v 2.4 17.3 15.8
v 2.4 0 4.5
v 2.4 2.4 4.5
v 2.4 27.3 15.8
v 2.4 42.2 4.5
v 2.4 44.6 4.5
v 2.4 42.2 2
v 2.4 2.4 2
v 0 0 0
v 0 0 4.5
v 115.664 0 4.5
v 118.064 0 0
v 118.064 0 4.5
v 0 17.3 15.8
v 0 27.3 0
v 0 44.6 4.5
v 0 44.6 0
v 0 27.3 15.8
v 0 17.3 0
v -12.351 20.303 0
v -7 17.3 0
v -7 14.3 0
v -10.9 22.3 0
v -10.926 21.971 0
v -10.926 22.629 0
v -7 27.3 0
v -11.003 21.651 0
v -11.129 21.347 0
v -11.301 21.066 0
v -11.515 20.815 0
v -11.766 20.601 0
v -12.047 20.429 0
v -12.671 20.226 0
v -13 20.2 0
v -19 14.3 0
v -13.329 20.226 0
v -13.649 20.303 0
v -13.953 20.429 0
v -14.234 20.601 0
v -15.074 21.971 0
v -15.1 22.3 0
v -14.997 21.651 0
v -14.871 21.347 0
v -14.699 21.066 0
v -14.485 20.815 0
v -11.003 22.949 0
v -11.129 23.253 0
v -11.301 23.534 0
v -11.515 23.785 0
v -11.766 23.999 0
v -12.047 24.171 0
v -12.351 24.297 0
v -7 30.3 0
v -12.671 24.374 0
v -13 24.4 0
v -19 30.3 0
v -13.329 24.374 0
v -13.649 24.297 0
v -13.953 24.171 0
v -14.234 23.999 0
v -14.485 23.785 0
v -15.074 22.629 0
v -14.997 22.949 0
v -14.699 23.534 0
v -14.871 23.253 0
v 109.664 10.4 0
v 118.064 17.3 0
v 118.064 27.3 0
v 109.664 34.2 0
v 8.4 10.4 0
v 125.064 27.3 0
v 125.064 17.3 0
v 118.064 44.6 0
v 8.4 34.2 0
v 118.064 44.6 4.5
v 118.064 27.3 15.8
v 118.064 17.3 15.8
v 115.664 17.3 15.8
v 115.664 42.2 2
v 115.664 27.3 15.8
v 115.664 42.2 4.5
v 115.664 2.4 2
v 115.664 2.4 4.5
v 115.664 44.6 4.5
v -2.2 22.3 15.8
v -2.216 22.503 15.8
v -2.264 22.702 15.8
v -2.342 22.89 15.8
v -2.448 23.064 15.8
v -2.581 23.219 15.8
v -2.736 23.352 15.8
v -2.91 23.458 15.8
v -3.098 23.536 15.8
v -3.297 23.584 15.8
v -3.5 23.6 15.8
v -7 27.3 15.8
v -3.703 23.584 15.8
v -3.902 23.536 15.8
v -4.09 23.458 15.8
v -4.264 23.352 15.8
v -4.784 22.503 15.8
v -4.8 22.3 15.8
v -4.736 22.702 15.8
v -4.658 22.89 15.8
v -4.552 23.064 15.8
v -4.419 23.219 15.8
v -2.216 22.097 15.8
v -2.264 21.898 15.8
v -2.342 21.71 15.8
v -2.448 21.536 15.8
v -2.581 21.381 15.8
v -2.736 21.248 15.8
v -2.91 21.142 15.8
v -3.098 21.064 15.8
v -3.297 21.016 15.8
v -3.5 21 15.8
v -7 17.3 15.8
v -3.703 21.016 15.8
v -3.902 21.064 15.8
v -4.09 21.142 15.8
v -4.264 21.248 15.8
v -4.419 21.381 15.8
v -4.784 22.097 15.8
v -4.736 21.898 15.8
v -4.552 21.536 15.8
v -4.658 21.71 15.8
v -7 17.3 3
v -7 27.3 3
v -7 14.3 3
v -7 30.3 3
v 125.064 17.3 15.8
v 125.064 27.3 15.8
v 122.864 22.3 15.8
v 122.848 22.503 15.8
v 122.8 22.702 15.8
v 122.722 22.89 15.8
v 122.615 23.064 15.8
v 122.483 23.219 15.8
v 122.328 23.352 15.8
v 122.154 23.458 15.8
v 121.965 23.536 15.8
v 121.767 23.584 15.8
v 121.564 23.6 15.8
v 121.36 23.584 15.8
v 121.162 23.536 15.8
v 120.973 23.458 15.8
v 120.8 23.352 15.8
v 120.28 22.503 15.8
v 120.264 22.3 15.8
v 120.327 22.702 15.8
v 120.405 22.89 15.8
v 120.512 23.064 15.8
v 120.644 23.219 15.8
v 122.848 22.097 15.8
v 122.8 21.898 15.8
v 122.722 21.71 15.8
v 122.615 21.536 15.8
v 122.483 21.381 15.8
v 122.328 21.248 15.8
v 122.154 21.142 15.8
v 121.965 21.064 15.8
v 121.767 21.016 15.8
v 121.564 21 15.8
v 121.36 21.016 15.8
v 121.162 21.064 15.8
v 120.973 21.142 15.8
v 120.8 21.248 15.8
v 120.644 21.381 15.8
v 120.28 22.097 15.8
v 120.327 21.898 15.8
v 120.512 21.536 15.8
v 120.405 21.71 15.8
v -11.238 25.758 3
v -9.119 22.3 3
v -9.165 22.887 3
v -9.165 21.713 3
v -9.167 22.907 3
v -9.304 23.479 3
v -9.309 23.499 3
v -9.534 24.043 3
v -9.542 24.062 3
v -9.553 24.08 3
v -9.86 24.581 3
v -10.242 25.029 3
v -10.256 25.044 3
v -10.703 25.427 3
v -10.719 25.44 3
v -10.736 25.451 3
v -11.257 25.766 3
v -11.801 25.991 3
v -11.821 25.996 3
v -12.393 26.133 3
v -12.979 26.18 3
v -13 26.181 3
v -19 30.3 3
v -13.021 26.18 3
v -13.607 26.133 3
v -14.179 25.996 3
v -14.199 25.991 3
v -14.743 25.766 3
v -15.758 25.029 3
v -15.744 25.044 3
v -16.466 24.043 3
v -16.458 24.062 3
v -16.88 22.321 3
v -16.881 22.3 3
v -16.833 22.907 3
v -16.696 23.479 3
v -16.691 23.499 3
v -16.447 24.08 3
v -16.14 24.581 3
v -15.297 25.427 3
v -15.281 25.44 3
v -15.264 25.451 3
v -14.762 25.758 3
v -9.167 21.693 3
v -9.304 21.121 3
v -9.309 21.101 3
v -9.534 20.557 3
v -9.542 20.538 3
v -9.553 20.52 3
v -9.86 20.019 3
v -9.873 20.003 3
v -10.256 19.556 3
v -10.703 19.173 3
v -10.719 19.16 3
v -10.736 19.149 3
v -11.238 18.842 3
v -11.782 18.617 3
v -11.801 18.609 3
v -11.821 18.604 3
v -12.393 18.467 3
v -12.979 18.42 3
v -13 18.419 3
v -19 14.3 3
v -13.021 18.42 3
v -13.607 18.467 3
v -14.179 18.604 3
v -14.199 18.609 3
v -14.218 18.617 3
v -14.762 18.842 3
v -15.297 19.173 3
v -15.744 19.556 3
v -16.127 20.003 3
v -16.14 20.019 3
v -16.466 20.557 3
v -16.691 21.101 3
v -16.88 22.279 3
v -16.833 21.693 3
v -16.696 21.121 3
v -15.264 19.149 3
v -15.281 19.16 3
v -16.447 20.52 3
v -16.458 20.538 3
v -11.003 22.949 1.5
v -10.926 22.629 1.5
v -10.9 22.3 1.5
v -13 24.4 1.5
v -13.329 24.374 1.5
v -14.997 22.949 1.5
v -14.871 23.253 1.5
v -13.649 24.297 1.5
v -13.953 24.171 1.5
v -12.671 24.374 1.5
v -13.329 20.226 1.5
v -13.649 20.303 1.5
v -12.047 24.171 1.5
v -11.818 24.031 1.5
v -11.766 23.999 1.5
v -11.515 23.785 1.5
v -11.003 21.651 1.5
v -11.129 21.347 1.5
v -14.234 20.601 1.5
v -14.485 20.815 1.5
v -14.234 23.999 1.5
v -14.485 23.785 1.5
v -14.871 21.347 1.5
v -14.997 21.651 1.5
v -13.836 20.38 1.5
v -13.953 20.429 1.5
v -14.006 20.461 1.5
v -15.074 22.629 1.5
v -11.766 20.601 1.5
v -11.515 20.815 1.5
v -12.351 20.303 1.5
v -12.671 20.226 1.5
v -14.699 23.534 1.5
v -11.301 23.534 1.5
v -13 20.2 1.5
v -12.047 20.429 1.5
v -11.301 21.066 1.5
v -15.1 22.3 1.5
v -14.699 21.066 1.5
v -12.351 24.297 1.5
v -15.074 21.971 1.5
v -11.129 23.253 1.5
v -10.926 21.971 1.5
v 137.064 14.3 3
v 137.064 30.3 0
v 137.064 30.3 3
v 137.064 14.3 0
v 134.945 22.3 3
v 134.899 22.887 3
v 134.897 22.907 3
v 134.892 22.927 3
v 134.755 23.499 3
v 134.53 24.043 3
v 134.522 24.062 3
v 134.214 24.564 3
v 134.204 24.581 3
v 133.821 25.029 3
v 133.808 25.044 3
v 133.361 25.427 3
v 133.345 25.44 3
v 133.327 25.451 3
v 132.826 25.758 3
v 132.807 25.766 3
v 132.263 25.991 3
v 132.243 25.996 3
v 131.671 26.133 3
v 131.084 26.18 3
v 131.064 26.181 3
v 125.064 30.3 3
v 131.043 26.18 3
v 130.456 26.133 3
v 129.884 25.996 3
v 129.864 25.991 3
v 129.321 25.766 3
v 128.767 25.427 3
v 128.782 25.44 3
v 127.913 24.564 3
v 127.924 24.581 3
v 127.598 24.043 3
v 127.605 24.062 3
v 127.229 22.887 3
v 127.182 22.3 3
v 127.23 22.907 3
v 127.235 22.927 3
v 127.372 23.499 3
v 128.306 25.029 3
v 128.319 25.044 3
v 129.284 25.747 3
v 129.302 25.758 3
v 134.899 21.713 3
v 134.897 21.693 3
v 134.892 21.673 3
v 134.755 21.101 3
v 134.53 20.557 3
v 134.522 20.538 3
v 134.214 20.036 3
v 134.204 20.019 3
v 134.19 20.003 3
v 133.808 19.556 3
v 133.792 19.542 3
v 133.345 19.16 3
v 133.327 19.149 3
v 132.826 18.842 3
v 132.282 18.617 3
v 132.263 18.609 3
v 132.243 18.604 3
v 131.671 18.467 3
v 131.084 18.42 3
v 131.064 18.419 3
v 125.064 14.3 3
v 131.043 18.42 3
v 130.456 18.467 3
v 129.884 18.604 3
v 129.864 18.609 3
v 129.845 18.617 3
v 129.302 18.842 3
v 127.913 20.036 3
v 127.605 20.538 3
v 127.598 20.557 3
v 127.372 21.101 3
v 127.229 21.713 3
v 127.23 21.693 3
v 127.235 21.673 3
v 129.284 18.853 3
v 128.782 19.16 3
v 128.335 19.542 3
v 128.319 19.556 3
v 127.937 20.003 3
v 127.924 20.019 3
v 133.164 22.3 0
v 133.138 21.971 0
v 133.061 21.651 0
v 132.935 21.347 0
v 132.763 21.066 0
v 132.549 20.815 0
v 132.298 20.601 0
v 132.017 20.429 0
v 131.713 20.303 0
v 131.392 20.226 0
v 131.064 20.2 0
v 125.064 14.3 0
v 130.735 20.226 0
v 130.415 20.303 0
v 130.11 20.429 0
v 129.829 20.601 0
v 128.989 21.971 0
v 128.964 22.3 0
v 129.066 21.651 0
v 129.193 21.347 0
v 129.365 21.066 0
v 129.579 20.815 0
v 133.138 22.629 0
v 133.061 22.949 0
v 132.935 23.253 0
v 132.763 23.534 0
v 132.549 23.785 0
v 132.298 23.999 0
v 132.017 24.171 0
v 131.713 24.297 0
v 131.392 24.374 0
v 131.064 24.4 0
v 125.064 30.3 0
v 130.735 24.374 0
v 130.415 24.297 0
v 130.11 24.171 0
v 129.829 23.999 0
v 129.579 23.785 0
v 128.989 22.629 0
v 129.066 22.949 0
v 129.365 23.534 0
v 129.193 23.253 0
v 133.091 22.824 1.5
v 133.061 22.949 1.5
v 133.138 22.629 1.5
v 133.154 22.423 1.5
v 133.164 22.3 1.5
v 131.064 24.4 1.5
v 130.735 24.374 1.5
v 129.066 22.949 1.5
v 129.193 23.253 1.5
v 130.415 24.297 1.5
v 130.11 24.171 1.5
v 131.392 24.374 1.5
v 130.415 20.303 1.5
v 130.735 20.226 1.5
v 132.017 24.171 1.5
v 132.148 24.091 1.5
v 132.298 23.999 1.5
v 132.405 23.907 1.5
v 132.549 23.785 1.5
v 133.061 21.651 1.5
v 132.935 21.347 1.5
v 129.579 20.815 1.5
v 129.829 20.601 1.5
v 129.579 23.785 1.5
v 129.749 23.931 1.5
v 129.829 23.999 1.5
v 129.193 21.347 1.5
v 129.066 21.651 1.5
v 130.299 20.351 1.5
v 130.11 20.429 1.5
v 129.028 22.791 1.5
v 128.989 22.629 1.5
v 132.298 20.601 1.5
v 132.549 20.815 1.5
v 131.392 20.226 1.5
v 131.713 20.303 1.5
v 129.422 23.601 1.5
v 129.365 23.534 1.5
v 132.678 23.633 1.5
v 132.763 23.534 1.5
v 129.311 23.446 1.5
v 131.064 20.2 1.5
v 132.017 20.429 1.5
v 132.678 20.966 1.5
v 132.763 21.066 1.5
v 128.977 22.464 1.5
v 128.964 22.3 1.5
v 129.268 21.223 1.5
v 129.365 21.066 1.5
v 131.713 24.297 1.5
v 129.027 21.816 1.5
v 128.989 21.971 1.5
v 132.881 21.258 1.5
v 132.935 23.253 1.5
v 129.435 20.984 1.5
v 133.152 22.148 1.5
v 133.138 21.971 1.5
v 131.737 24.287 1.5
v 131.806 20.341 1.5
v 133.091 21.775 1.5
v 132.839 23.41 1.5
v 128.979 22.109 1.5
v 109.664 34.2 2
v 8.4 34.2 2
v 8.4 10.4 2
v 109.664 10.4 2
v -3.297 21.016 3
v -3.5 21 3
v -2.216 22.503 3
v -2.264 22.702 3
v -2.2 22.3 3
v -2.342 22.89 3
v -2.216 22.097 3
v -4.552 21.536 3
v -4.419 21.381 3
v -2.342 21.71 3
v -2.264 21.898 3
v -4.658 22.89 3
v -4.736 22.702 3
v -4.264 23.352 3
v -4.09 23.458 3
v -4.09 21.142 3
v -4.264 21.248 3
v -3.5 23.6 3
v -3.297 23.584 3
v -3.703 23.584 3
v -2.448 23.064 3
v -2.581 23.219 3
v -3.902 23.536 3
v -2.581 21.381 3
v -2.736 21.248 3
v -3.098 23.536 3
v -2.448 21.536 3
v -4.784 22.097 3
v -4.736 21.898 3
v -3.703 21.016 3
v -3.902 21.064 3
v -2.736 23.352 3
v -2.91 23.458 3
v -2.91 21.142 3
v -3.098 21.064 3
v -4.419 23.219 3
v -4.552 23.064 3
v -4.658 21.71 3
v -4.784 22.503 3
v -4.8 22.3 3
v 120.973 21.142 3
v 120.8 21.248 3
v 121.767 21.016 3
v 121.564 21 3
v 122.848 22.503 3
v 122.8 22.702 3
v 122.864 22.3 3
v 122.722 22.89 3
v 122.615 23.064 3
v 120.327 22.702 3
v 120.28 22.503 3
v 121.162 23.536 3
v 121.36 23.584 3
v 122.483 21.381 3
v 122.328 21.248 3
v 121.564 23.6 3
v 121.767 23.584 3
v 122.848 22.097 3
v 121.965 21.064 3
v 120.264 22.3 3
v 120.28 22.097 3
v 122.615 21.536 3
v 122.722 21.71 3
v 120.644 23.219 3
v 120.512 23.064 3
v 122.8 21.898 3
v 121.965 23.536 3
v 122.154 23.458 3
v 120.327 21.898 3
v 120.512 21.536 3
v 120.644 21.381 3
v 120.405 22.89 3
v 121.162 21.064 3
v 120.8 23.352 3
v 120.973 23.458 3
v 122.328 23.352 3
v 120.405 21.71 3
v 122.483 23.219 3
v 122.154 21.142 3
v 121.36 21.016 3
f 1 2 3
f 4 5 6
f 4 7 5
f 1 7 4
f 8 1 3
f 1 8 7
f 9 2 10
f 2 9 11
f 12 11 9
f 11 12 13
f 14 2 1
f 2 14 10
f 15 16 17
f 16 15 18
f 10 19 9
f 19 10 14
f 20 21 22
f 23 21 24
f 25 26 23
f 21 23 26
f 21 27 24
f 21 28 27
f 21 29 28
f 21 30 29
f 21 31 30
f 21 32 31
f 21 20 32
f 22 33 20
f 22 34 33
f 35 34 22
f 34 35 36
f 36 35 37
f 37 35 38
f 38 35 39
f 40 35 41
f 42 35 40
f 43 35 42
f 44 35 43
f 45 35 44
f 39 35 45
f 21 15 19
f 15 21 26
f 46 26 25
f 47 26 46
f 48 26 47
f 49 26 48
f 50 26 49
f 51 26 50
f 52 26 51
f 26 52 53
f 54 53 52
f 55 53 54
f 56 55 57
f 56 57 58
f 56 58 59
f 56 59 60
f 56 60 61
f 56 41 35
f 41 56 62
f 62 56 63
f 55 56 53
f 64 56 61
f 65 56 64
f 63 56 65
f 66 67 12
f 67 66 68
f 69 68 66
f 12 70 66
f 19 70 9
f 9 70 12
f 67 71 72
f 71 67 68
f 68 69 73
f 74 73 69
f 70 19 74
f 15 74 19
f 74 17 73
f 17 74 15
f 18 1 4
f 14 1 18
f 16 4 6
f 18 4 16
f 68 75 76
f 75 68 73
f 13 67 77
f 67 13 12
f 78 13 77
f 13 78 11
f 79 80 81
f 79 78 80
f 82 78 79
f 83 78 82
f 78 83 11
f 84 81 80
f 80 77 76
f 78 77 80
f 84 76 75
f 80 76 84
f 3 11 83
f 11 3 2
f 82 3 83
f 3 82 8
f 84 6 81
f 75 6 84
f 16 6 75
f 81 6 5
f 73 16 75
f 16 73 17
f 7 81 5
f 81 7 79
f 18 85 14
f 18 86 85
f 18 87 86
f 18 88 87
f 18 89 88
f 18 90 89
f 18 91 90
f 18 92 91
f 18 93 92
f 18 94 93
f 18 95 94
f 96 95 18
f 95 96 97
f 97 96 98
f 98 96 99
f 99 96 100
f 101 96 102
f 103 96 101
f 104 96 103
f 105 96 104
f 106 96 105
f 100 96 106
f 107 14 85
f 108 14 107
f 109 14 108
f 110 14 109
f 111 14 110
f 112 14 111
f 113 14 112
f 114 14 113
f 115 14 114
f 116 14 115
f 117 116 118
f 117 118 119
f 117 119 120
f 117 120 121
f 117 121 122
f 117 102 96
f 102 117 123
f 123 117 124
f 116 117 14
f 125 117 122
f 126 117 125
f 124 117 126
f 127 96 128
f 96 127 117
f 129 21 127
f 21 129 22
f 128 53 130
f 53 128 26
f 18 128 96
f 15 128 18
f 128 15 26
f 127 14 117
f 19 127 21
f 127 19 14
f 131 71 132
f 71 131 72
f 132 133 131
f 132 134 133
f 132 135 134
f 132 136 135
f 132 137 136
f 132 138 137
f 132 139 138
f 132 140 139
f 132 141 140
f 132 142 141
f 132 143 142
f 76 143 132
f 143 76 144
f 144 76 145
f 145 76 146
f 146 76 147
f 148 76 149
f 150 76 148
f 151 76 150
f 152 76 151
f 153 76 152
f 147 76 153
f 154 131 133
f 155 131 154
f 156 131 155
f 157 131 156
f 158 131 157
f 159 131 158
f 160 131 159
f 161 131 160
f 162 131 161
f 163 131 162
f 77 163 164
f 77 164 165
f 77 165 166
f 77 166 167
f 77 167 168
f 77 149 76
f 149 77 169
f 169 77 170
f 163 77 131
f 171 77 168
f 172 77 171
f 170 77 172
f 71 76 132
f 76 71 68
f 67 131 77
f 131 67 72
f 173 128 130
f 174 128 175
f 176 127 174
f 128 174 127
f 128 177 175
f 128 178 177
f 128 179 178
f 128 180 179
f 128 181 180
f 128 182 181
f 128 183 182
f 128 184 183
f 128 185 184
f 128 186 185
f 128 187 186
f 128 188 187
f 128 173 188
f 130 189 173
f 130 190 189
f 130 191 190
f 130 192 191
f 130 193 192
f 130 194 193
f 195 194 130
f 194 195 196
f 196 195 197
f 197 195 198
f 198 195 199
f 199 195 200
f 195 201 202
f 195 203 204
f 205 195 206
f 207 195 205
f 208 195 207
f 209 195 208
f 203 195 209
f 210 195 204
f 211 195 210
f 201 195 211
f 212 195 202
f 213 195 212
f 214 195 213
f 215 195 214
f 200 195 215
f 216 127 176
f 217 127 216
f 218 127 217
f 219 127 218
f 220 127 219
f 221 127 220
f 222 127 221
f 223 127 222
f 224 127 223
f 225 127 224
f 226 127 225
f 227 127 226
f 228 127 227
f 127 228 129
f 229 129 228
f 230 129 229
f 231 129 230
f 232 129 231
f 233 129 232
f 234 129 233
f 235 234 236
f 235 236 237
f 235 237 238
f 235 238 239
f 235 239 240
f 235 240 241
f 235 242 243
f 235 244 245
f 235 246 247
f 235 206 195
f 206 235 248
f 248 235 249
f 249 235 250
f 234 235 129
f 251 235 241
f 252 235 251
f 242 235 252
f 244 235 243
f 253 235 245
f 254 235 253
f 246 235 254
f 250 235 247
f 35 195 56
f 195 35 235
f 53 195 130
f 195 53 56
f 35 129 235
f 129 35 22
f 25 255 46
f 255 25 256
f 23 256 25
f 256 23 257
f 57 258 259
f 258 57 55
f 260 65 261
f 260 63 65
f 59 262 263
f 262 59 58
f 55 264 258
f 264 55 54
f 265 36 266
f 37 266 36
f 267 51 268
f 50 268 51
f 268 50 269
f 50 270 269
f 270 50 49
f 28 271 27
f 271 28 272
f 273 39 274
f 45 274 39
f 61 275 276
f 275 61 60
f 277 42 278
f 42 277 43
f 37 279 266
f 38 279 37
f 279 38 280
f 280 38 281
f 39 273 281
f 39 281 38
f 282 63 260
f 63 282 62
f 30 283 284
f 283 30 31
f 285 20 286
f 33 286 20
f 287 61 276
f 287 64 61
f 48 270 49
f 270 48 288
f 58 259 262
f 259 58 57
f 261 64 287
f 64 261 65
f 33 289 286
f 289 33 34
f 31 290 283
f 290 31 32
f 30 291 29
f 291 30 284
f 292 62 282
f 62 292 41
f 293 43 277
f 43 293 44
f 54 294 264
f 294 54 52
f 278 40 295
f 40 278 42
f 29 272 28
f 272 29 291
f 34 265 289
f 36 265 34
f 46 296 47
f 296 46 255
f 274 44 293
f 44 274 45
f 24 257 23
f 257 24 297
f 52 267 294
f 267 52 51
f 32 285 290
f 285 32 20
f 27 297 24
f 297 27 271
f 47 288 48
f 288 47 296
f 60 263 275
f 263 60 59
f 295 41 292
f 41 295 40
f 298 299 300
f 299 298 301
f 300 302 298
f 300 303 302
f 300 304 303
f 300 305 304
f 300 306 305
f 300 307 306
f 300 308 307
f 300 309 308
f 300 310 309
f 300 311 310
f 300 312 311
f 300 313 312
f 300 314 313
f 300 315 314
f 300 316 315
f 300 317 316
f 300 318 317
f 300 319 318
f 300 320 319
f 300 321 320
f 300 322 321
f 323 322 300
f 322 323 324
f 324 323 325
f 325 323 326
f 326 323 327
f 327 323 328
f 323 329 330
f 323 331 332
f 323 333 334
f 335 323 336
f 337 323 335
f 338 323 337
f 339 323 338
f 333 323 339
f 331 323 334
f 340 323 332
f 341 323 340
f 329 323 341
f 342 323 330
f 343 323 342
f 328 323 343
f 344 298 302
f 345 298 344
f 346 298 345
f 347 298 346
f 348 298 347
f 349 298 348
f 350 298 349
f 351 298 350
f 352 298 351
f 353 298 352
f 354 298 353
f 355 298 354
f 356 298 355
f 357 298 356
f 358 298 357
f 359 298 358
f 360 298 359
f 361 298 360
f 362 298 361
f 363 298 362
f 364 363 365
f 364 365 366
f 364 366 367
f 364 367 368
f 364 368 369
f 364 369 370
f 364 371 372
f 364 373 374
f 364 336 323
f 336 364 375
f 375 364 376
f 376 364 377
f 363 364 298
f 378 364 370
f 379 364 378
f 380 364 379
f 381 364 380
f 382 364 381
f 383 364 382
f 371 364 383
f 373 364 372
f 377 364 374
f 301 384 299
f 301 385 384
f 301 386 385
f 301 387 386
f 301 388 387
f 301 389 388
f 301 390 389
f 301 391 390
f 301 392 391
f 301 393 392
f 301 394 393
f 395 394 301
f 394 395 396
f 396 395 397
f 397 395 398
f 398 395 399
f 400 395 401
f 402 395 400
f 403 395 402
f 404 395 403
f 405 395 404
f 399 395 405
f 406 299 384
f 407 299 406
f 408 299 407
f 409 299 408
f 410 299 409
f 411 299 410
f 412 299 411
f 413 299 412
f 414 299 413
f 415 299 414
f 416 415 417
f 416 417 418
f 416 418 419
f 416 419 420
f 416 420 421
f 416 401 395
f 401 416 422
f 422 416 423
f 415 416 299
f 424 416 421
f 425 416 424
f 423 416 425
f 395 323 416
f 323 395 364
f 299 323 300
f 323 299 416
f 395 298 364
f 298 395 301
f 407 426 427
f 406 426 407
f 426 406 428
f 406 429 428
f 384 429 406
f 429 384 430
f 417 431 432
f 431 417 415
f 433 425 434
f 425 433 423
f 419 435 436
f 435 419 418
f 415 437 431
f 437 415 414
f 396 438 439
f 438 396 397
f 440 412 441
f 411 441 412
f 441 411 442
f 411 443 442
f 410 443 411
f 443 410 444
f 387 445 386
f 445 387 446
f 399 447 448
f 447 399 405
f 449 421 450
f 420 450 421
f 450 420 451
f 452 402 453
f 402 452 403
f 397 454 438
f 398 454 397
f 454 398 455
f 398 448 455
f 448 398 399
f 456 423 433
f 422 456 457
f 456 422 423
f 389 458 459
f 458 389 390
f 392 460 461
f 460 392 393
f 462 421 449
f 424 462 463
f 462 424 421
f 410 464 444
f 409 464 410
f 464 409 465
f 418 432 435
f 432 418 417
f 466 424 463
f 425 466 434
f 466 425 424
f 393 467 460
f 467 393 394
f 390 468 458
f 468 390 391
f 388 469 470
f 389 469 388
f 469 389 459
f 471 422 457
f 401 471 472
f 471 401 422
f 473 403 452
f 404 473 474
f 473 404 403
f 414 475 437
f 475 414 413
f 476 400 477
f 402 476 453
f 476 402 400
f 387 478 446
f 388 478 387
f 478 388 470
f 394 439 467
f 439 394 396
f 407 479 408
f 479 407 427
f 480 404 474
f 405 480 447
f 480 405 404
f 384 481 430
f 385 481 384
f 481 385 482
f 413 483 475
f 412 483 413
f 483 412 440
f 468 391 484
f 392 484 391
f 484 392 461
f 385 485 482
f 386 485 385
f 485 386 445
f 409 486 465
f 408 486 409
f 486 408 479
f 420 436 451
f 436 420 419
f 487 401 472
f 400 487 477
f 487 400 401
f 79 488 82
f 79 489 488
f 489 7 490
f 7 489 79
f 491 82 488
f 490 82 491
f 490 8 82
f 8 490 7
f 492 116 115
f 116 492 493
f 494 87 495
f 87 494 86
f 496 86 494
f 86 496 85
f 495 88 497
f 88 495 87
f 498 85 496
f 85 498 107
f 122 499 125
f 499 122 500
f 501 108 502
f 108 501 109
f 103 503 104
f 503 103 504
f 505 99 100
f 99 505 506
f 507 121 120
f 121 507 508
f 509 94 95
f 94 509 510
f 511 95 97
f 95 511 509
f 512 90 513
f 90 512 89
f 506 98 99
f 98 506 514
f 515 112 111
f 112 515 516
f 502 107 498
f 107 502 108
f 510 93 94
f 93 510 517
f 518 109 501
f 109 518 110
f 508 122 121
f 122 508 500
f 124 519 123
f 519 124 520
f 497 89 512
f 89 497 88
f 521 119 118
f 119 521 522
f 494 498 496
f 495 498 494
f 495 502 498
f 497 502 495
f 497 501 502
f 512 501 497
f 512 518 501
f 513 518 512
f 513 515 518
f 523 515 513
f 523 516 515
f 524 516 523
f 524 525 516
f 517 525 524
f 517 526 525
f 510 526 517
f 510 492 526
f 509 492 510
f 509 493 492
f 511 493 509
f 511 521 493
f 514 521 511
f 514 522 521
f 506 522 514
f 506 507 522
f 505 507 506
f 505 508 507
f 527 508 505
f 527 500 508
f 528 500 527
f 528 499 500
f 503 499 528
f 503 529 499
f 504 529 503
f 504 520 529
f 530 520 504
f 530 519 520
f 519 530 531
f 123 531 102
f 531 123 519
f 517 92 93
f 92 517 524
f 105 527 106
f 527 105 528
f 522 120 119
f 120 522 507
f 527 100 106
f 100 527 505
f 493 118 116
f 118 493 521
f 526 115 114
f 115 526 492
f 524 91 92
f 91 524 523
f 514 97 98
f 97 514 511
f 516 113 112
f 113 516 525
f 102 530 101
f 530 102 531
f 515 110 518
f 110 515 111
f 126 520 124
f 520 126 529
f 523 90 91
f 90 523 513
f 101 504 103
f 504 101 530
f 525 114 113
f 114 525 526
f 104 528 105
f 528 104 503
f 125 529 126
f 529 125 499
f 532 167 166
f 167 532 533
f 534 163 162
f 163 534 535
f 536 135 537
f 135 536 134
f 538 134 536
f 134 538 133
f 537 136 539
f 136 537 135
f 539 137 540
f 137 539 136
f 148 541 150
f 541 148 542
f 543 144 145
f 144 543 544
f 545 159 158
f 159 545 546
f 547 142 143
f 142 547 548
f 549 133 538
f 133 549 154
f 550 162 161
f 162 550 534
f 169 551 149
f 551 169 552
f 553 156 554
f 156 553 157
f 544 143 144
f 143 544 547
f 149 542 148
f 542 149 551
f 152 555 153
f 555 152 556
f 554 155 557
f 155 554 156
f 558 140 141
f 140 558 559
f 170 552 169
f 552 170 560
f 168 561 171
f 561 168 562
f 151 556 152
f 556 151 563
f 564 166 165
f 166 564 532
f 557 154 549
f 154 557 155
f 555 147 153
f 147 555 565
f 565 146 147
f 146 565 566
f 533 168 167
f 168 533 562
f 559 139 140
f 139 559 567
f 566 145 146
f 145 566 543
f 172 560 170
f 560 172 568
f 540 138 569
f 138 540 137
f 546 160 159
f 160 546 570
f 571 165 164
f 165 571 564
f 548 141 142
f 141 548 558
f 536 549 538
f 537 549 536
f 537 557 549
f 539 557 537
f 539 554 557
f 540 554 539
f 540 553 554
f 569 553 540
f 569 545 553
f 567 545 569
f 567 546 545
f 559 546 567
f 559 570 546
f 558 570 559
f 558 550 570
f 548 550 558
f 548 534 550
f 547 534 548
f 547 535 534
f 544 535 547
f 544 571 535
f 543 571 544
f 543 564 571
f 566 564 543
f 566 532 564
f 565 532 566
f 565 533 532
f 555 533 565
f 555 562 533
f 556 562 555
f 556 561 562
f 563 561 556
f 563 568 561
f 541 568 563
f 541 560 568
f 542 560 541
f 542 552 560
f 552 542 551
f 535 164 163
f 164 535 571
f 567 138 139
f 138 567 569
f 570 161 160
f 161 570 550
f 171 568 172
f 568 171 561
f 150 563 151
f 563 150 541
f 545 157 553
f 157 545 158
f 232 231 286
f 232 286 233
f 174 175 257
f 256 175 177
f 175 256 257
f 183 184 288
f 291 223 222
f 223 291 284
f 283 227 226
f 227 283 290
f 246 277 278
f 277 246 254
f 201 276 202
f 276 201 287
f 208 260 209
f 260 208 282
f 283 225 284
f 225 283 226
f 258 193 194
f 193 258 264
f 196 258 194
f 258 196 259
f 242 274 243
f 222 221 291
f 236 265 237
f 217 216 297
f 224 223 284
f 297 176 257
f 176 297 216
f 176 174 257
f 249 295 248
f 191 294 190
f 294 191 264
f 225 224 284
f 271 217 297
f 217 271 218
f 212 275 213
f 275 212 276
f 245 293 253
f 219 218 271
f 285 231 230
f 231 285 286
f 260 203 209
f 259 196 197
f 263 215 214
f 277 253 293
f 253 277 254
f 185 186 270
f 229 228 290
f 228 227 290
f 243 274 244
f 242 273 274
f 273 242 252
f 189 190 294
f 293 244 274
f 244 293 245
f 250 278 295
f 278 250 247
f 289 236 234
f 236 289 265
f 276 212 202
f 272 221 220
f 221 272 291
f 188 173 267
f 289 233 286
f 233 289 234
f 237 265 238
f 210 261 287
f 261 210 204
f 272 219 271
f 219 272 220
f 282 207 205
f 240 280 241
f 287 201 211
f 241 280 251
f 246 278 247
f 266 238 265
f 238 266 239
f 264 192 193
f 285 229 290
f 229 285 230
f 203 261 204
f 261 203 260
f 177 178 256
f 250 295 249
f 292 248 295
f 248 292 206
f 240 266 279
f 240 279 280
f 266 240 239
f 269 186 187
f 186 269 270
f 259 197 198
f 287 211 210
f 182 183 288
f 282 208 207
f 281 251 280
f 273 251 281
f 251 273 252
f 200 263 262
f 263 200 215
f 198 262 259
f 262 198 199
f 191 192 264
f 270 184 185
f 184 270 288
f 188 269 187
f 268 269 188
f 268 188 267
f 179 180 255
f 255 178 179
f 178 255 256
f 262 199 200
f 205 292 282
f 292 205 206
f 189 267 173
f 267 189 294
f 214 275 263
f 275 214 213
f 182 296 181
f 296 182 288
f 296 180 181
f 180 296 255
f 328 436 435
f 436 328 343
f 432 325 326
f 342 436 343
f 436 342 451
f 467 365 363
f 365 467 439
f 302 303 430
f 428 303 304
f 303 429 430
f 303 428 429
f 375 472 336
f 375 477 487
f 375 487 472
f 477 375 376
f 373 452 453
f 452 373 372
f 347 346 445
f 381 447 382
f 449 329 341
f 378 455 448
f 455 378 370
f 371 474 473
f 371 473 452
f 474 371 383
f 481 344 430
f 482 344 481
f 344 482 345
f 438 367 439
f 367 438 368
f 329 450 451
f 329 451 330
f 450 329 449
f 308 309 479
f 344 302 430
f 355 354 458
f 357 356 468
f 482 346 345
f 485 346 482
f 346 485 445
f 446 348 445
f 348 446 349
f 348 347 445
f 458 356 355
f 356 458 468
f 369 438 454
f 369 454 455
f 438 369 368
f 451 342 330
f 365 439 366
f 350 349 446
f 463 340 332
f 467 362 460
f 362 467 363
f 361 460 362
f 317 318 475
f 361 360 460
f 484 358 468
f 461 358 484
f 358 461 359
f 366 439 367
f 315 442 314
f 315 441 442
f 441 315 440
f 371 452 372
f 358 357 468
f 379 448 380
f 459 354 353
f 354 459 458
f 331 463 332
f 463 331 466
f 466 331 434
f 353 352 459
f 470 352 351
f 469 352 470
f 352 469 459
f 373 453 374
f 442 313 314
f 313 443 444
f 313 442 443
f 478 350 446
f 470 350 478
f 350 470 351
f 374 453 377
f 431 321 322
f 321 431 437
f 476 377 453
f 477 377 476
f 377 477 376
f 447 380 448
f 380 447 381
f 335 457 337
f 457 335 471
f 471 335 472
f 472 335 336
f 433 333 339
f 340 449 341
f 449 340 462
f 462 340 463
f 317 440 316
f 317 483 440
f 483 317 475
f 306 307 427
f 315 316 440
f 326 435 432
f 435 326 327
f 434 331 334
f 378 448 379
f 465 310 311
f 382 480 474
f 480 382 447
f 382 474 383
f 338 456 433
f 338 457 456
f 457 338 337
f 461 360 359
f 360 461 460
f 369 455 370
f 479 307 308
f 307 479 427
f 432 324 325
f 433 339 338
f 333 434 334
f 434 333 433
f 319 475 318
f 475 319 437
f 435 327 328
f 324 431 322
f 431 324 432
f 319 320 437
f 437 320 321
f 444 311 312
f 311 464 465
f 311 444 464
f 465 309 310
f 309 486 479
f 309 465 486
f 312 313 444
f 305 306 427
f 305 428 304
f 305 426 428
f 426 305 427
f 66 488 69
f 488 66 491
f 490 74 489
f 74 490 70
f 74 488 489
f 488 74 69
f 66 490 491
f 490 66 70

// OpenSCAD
// Holder for 13 lever splice connectors (Adafruit 5619, inline 1-in/1-out)
// clipped together side by side, for the keypad wires.
// Measured block of 11: 95.5 wide x 39.4 long (wire direction); 13 = about 112.8
// x 14.75 tall. Open top so the levers work; wires leave both long sides.
//
// The block drops into the tray. A strap across the middle, between the
// levers, has a short peg that goes into the hole on top of each connector,
// and screws down onto the two end walls (M3 x 10 or #4 x 3/8" self-tapping).
//
// part = "fittest"       : tray only 2 connectors wide   } print these two
// part = "strap_fittest" : matching 2-connector strap     } first
// part = "holder"        : the real tray for 13
// part = "strap"         : the real strap for 13
// part = "both"          : preview, strap in place
// Print flat, no supports. The strap prints pegs up.

part = "holder";

count    = 13;
each_w   = 95.5 / 11;     // 8.68 mm per connector: 11 measured 95.5, fit test 2 perfect (13 = about 112.8)
block_w  = count * each_w;
block_l  = 39.4;          // along the wires
block_h  = 14.75;

// ---- groove and hole on top of each connector (2026-10-29) ----
groove_w = 5.5;           // measured: groove across the top for a strap
groove_z = 13.8;          // measured 14.8 (connector bottom to groove floor); lowered 1 mm after fit test 2
hole_d   = 2.74;          // measured: round hole in the groove
peg_d    = 2.65;           // peg is a little smaller than the hole
peg_h    = 2.0;           // how deep the peg goes into the hole
hole_y   = 0;             // hole centre offset from the connector's middle, along the wires
hole_x   = 0;             // hole centre offset from the connector's middle, across it

clear_w  = 0.4;           // total extra room across the block
clear_l  = 0.4;           // total extra room along the wires
wall     = 2.4;
floor_t  = 2.0;
side_lip_h = 2.5;         // low lips on the wire sides (keep below the wire holes)
boss_w   = 10;            // screw boss on each end wall, under the strap
boss_t   = 7;             // boss thickness (outward from the wall)
pilot_d  = 2.6;           // pilot hole for the strap screw
strap_w  = groove_w - 0.3; // strap sits in the groove
strap_t  = 3;
screw_d  = 3.4;           // clearance hole in the strap
ear_l    = 12;            // screw ears to fix the tray in the cabinet (#6 wood screws)
ear_hole = 4.2;

fit      = (part == "fittest" || part == "strap_fittest");
n        = fit ? 2 : count;
in_w     = n * each_w + (fit ? 0.15 : clear_w);
in_l     = block_l + clear_l;
out_w    = in_w + 2*wall;
out_l    = in_l + 2*wall;
wall_h   = floor_t + groove_z;        // screw posts level with the groove floor,
groove_d = 0;                         // so the strap is a flat bar with no dip
yc       = out_l / 2;                 // strap centre line

$fn = 40;

module tray() {
  difference() {
    union() {
      cube([out_w, out_l, floor_t]);                          // floor
      for (x = [0, out_w - wall])                             // end walls, tapered
        translate([x, 0, 0]) end_wall();
      for (y = [0, out_l - wall])                             // low wire-side lips
        translate([0, y, 0]) cube([out_w, wall, floor_t + side_lip_h]);
      for (x = [-boss_t, out_w])                              // screw bosses
        translate([x, yc - boss_w/2, 0]) cube([boss_t, boss_w, wall_h]);
      if (!fit)                                               // mounting ears
        for (x = [-boss_t - ear_l, out_w + boss_t]) translate([x, yc - 8, 0])
          difference() {
            cube([ear_l, 16, 3]);
            translate([ear_l/2, 8, -1]) cylinder(d = ear_hole, h = 5);
          }
    }
    for (x = [-boss_t/2, out_w + boss_t/2])                   // strap screw pilots
      translate([x, yc, floor_t + 1]) cylinder(d = pilot_d, h = wall_h);
    // floor window: saves plastic and lets you push the block out from below
    translate([wall + 6, wall + 8, -1]) cube([max(in_w - 12, 2), in_l - 16, floor_t + 2]);
    if (!fit)
      for (x = [-boss_t - ear_l/2, out_w + boss_t + ear_l/2])
        translate([x, yc, 1.5]) cylinder(d1 = ear_hole, d2 = 8, h = 1.6);
  }
}

// End wall: full height only beside the screw post, then sloping down to lip
// height right at the holder's ends, so the levers on the end connectors are free.
module end_wall() {
  low = floor_t + side_lip_h;
  top = boss_w / 2;                     // full height only beside the screw post
  run = yc - top;                       // slope runs all the way to the holder's ends
  rotate([90, 0, 90]) linear_extrude(wall)
    polygon([[0, 0], [out_l, 0], [out_l, low],
             [yc + top + run, low], [yc + top, wall_h],
             [yc - top, wall_h], [yc - top - run, low], [0, low]]);
}

// Strap, modelled in place (bottom face on the connector tops).
module strap() {
  difference() {
    union() {
      translate([-boss_t, yc - strap_w/2, wall_h]) cube([out_w + 2*boss_t, strap_w, strap_t]);
      // the part between the end walls drops into the connectors' groove
      if (groove_d > 0)
        translate([wall + 0.2, yc - strap_w/2, wall_h - groove_d])
          cube([in_w - 0.4, strap_w, groove_d + 0.01]);
      for (i = [0 : n - 1])                                   // one peg per connector
        translate([wall + (in_w - n*each_w)/2 + (i + 0.5)*each_w + hole_x,
                   yc + hole_y, wall_h - groove_d - peg_h])
          cylinder(d1 = peg_d - 0.6, d2 = peg_d, h = 0.6 + 0.01);
      for (i = [0 : n - 1])
        translate([wall + (in_w - n*each_w)/2 + (i + 0.5)*each_w + hole_x,
                   yc + hole_y, wall_h - groove_d - peg_h + 0.6])
          cylinder(d = peg_d, h = peg_h - 0.6 + 0.01);
    }
    for (x = [-boss_t/2, out_w + boss_t/2])
      translate([x, yc, wall_h - 1]) cylinder(d = screw_d, h = strap_t + 2);
  }
}

if (part == "holder" || part == "fittest") tray();
else if (part == "strap" || part == "strap_fittest")
  translate([0, 0, wall_h + strap_t]) rotate([180, 0, 0]) translate([0, -2*yc, 0]) strap();  // pegs up (z<0 parts lifted below)
else { tray(); color("orange") strap(); }
